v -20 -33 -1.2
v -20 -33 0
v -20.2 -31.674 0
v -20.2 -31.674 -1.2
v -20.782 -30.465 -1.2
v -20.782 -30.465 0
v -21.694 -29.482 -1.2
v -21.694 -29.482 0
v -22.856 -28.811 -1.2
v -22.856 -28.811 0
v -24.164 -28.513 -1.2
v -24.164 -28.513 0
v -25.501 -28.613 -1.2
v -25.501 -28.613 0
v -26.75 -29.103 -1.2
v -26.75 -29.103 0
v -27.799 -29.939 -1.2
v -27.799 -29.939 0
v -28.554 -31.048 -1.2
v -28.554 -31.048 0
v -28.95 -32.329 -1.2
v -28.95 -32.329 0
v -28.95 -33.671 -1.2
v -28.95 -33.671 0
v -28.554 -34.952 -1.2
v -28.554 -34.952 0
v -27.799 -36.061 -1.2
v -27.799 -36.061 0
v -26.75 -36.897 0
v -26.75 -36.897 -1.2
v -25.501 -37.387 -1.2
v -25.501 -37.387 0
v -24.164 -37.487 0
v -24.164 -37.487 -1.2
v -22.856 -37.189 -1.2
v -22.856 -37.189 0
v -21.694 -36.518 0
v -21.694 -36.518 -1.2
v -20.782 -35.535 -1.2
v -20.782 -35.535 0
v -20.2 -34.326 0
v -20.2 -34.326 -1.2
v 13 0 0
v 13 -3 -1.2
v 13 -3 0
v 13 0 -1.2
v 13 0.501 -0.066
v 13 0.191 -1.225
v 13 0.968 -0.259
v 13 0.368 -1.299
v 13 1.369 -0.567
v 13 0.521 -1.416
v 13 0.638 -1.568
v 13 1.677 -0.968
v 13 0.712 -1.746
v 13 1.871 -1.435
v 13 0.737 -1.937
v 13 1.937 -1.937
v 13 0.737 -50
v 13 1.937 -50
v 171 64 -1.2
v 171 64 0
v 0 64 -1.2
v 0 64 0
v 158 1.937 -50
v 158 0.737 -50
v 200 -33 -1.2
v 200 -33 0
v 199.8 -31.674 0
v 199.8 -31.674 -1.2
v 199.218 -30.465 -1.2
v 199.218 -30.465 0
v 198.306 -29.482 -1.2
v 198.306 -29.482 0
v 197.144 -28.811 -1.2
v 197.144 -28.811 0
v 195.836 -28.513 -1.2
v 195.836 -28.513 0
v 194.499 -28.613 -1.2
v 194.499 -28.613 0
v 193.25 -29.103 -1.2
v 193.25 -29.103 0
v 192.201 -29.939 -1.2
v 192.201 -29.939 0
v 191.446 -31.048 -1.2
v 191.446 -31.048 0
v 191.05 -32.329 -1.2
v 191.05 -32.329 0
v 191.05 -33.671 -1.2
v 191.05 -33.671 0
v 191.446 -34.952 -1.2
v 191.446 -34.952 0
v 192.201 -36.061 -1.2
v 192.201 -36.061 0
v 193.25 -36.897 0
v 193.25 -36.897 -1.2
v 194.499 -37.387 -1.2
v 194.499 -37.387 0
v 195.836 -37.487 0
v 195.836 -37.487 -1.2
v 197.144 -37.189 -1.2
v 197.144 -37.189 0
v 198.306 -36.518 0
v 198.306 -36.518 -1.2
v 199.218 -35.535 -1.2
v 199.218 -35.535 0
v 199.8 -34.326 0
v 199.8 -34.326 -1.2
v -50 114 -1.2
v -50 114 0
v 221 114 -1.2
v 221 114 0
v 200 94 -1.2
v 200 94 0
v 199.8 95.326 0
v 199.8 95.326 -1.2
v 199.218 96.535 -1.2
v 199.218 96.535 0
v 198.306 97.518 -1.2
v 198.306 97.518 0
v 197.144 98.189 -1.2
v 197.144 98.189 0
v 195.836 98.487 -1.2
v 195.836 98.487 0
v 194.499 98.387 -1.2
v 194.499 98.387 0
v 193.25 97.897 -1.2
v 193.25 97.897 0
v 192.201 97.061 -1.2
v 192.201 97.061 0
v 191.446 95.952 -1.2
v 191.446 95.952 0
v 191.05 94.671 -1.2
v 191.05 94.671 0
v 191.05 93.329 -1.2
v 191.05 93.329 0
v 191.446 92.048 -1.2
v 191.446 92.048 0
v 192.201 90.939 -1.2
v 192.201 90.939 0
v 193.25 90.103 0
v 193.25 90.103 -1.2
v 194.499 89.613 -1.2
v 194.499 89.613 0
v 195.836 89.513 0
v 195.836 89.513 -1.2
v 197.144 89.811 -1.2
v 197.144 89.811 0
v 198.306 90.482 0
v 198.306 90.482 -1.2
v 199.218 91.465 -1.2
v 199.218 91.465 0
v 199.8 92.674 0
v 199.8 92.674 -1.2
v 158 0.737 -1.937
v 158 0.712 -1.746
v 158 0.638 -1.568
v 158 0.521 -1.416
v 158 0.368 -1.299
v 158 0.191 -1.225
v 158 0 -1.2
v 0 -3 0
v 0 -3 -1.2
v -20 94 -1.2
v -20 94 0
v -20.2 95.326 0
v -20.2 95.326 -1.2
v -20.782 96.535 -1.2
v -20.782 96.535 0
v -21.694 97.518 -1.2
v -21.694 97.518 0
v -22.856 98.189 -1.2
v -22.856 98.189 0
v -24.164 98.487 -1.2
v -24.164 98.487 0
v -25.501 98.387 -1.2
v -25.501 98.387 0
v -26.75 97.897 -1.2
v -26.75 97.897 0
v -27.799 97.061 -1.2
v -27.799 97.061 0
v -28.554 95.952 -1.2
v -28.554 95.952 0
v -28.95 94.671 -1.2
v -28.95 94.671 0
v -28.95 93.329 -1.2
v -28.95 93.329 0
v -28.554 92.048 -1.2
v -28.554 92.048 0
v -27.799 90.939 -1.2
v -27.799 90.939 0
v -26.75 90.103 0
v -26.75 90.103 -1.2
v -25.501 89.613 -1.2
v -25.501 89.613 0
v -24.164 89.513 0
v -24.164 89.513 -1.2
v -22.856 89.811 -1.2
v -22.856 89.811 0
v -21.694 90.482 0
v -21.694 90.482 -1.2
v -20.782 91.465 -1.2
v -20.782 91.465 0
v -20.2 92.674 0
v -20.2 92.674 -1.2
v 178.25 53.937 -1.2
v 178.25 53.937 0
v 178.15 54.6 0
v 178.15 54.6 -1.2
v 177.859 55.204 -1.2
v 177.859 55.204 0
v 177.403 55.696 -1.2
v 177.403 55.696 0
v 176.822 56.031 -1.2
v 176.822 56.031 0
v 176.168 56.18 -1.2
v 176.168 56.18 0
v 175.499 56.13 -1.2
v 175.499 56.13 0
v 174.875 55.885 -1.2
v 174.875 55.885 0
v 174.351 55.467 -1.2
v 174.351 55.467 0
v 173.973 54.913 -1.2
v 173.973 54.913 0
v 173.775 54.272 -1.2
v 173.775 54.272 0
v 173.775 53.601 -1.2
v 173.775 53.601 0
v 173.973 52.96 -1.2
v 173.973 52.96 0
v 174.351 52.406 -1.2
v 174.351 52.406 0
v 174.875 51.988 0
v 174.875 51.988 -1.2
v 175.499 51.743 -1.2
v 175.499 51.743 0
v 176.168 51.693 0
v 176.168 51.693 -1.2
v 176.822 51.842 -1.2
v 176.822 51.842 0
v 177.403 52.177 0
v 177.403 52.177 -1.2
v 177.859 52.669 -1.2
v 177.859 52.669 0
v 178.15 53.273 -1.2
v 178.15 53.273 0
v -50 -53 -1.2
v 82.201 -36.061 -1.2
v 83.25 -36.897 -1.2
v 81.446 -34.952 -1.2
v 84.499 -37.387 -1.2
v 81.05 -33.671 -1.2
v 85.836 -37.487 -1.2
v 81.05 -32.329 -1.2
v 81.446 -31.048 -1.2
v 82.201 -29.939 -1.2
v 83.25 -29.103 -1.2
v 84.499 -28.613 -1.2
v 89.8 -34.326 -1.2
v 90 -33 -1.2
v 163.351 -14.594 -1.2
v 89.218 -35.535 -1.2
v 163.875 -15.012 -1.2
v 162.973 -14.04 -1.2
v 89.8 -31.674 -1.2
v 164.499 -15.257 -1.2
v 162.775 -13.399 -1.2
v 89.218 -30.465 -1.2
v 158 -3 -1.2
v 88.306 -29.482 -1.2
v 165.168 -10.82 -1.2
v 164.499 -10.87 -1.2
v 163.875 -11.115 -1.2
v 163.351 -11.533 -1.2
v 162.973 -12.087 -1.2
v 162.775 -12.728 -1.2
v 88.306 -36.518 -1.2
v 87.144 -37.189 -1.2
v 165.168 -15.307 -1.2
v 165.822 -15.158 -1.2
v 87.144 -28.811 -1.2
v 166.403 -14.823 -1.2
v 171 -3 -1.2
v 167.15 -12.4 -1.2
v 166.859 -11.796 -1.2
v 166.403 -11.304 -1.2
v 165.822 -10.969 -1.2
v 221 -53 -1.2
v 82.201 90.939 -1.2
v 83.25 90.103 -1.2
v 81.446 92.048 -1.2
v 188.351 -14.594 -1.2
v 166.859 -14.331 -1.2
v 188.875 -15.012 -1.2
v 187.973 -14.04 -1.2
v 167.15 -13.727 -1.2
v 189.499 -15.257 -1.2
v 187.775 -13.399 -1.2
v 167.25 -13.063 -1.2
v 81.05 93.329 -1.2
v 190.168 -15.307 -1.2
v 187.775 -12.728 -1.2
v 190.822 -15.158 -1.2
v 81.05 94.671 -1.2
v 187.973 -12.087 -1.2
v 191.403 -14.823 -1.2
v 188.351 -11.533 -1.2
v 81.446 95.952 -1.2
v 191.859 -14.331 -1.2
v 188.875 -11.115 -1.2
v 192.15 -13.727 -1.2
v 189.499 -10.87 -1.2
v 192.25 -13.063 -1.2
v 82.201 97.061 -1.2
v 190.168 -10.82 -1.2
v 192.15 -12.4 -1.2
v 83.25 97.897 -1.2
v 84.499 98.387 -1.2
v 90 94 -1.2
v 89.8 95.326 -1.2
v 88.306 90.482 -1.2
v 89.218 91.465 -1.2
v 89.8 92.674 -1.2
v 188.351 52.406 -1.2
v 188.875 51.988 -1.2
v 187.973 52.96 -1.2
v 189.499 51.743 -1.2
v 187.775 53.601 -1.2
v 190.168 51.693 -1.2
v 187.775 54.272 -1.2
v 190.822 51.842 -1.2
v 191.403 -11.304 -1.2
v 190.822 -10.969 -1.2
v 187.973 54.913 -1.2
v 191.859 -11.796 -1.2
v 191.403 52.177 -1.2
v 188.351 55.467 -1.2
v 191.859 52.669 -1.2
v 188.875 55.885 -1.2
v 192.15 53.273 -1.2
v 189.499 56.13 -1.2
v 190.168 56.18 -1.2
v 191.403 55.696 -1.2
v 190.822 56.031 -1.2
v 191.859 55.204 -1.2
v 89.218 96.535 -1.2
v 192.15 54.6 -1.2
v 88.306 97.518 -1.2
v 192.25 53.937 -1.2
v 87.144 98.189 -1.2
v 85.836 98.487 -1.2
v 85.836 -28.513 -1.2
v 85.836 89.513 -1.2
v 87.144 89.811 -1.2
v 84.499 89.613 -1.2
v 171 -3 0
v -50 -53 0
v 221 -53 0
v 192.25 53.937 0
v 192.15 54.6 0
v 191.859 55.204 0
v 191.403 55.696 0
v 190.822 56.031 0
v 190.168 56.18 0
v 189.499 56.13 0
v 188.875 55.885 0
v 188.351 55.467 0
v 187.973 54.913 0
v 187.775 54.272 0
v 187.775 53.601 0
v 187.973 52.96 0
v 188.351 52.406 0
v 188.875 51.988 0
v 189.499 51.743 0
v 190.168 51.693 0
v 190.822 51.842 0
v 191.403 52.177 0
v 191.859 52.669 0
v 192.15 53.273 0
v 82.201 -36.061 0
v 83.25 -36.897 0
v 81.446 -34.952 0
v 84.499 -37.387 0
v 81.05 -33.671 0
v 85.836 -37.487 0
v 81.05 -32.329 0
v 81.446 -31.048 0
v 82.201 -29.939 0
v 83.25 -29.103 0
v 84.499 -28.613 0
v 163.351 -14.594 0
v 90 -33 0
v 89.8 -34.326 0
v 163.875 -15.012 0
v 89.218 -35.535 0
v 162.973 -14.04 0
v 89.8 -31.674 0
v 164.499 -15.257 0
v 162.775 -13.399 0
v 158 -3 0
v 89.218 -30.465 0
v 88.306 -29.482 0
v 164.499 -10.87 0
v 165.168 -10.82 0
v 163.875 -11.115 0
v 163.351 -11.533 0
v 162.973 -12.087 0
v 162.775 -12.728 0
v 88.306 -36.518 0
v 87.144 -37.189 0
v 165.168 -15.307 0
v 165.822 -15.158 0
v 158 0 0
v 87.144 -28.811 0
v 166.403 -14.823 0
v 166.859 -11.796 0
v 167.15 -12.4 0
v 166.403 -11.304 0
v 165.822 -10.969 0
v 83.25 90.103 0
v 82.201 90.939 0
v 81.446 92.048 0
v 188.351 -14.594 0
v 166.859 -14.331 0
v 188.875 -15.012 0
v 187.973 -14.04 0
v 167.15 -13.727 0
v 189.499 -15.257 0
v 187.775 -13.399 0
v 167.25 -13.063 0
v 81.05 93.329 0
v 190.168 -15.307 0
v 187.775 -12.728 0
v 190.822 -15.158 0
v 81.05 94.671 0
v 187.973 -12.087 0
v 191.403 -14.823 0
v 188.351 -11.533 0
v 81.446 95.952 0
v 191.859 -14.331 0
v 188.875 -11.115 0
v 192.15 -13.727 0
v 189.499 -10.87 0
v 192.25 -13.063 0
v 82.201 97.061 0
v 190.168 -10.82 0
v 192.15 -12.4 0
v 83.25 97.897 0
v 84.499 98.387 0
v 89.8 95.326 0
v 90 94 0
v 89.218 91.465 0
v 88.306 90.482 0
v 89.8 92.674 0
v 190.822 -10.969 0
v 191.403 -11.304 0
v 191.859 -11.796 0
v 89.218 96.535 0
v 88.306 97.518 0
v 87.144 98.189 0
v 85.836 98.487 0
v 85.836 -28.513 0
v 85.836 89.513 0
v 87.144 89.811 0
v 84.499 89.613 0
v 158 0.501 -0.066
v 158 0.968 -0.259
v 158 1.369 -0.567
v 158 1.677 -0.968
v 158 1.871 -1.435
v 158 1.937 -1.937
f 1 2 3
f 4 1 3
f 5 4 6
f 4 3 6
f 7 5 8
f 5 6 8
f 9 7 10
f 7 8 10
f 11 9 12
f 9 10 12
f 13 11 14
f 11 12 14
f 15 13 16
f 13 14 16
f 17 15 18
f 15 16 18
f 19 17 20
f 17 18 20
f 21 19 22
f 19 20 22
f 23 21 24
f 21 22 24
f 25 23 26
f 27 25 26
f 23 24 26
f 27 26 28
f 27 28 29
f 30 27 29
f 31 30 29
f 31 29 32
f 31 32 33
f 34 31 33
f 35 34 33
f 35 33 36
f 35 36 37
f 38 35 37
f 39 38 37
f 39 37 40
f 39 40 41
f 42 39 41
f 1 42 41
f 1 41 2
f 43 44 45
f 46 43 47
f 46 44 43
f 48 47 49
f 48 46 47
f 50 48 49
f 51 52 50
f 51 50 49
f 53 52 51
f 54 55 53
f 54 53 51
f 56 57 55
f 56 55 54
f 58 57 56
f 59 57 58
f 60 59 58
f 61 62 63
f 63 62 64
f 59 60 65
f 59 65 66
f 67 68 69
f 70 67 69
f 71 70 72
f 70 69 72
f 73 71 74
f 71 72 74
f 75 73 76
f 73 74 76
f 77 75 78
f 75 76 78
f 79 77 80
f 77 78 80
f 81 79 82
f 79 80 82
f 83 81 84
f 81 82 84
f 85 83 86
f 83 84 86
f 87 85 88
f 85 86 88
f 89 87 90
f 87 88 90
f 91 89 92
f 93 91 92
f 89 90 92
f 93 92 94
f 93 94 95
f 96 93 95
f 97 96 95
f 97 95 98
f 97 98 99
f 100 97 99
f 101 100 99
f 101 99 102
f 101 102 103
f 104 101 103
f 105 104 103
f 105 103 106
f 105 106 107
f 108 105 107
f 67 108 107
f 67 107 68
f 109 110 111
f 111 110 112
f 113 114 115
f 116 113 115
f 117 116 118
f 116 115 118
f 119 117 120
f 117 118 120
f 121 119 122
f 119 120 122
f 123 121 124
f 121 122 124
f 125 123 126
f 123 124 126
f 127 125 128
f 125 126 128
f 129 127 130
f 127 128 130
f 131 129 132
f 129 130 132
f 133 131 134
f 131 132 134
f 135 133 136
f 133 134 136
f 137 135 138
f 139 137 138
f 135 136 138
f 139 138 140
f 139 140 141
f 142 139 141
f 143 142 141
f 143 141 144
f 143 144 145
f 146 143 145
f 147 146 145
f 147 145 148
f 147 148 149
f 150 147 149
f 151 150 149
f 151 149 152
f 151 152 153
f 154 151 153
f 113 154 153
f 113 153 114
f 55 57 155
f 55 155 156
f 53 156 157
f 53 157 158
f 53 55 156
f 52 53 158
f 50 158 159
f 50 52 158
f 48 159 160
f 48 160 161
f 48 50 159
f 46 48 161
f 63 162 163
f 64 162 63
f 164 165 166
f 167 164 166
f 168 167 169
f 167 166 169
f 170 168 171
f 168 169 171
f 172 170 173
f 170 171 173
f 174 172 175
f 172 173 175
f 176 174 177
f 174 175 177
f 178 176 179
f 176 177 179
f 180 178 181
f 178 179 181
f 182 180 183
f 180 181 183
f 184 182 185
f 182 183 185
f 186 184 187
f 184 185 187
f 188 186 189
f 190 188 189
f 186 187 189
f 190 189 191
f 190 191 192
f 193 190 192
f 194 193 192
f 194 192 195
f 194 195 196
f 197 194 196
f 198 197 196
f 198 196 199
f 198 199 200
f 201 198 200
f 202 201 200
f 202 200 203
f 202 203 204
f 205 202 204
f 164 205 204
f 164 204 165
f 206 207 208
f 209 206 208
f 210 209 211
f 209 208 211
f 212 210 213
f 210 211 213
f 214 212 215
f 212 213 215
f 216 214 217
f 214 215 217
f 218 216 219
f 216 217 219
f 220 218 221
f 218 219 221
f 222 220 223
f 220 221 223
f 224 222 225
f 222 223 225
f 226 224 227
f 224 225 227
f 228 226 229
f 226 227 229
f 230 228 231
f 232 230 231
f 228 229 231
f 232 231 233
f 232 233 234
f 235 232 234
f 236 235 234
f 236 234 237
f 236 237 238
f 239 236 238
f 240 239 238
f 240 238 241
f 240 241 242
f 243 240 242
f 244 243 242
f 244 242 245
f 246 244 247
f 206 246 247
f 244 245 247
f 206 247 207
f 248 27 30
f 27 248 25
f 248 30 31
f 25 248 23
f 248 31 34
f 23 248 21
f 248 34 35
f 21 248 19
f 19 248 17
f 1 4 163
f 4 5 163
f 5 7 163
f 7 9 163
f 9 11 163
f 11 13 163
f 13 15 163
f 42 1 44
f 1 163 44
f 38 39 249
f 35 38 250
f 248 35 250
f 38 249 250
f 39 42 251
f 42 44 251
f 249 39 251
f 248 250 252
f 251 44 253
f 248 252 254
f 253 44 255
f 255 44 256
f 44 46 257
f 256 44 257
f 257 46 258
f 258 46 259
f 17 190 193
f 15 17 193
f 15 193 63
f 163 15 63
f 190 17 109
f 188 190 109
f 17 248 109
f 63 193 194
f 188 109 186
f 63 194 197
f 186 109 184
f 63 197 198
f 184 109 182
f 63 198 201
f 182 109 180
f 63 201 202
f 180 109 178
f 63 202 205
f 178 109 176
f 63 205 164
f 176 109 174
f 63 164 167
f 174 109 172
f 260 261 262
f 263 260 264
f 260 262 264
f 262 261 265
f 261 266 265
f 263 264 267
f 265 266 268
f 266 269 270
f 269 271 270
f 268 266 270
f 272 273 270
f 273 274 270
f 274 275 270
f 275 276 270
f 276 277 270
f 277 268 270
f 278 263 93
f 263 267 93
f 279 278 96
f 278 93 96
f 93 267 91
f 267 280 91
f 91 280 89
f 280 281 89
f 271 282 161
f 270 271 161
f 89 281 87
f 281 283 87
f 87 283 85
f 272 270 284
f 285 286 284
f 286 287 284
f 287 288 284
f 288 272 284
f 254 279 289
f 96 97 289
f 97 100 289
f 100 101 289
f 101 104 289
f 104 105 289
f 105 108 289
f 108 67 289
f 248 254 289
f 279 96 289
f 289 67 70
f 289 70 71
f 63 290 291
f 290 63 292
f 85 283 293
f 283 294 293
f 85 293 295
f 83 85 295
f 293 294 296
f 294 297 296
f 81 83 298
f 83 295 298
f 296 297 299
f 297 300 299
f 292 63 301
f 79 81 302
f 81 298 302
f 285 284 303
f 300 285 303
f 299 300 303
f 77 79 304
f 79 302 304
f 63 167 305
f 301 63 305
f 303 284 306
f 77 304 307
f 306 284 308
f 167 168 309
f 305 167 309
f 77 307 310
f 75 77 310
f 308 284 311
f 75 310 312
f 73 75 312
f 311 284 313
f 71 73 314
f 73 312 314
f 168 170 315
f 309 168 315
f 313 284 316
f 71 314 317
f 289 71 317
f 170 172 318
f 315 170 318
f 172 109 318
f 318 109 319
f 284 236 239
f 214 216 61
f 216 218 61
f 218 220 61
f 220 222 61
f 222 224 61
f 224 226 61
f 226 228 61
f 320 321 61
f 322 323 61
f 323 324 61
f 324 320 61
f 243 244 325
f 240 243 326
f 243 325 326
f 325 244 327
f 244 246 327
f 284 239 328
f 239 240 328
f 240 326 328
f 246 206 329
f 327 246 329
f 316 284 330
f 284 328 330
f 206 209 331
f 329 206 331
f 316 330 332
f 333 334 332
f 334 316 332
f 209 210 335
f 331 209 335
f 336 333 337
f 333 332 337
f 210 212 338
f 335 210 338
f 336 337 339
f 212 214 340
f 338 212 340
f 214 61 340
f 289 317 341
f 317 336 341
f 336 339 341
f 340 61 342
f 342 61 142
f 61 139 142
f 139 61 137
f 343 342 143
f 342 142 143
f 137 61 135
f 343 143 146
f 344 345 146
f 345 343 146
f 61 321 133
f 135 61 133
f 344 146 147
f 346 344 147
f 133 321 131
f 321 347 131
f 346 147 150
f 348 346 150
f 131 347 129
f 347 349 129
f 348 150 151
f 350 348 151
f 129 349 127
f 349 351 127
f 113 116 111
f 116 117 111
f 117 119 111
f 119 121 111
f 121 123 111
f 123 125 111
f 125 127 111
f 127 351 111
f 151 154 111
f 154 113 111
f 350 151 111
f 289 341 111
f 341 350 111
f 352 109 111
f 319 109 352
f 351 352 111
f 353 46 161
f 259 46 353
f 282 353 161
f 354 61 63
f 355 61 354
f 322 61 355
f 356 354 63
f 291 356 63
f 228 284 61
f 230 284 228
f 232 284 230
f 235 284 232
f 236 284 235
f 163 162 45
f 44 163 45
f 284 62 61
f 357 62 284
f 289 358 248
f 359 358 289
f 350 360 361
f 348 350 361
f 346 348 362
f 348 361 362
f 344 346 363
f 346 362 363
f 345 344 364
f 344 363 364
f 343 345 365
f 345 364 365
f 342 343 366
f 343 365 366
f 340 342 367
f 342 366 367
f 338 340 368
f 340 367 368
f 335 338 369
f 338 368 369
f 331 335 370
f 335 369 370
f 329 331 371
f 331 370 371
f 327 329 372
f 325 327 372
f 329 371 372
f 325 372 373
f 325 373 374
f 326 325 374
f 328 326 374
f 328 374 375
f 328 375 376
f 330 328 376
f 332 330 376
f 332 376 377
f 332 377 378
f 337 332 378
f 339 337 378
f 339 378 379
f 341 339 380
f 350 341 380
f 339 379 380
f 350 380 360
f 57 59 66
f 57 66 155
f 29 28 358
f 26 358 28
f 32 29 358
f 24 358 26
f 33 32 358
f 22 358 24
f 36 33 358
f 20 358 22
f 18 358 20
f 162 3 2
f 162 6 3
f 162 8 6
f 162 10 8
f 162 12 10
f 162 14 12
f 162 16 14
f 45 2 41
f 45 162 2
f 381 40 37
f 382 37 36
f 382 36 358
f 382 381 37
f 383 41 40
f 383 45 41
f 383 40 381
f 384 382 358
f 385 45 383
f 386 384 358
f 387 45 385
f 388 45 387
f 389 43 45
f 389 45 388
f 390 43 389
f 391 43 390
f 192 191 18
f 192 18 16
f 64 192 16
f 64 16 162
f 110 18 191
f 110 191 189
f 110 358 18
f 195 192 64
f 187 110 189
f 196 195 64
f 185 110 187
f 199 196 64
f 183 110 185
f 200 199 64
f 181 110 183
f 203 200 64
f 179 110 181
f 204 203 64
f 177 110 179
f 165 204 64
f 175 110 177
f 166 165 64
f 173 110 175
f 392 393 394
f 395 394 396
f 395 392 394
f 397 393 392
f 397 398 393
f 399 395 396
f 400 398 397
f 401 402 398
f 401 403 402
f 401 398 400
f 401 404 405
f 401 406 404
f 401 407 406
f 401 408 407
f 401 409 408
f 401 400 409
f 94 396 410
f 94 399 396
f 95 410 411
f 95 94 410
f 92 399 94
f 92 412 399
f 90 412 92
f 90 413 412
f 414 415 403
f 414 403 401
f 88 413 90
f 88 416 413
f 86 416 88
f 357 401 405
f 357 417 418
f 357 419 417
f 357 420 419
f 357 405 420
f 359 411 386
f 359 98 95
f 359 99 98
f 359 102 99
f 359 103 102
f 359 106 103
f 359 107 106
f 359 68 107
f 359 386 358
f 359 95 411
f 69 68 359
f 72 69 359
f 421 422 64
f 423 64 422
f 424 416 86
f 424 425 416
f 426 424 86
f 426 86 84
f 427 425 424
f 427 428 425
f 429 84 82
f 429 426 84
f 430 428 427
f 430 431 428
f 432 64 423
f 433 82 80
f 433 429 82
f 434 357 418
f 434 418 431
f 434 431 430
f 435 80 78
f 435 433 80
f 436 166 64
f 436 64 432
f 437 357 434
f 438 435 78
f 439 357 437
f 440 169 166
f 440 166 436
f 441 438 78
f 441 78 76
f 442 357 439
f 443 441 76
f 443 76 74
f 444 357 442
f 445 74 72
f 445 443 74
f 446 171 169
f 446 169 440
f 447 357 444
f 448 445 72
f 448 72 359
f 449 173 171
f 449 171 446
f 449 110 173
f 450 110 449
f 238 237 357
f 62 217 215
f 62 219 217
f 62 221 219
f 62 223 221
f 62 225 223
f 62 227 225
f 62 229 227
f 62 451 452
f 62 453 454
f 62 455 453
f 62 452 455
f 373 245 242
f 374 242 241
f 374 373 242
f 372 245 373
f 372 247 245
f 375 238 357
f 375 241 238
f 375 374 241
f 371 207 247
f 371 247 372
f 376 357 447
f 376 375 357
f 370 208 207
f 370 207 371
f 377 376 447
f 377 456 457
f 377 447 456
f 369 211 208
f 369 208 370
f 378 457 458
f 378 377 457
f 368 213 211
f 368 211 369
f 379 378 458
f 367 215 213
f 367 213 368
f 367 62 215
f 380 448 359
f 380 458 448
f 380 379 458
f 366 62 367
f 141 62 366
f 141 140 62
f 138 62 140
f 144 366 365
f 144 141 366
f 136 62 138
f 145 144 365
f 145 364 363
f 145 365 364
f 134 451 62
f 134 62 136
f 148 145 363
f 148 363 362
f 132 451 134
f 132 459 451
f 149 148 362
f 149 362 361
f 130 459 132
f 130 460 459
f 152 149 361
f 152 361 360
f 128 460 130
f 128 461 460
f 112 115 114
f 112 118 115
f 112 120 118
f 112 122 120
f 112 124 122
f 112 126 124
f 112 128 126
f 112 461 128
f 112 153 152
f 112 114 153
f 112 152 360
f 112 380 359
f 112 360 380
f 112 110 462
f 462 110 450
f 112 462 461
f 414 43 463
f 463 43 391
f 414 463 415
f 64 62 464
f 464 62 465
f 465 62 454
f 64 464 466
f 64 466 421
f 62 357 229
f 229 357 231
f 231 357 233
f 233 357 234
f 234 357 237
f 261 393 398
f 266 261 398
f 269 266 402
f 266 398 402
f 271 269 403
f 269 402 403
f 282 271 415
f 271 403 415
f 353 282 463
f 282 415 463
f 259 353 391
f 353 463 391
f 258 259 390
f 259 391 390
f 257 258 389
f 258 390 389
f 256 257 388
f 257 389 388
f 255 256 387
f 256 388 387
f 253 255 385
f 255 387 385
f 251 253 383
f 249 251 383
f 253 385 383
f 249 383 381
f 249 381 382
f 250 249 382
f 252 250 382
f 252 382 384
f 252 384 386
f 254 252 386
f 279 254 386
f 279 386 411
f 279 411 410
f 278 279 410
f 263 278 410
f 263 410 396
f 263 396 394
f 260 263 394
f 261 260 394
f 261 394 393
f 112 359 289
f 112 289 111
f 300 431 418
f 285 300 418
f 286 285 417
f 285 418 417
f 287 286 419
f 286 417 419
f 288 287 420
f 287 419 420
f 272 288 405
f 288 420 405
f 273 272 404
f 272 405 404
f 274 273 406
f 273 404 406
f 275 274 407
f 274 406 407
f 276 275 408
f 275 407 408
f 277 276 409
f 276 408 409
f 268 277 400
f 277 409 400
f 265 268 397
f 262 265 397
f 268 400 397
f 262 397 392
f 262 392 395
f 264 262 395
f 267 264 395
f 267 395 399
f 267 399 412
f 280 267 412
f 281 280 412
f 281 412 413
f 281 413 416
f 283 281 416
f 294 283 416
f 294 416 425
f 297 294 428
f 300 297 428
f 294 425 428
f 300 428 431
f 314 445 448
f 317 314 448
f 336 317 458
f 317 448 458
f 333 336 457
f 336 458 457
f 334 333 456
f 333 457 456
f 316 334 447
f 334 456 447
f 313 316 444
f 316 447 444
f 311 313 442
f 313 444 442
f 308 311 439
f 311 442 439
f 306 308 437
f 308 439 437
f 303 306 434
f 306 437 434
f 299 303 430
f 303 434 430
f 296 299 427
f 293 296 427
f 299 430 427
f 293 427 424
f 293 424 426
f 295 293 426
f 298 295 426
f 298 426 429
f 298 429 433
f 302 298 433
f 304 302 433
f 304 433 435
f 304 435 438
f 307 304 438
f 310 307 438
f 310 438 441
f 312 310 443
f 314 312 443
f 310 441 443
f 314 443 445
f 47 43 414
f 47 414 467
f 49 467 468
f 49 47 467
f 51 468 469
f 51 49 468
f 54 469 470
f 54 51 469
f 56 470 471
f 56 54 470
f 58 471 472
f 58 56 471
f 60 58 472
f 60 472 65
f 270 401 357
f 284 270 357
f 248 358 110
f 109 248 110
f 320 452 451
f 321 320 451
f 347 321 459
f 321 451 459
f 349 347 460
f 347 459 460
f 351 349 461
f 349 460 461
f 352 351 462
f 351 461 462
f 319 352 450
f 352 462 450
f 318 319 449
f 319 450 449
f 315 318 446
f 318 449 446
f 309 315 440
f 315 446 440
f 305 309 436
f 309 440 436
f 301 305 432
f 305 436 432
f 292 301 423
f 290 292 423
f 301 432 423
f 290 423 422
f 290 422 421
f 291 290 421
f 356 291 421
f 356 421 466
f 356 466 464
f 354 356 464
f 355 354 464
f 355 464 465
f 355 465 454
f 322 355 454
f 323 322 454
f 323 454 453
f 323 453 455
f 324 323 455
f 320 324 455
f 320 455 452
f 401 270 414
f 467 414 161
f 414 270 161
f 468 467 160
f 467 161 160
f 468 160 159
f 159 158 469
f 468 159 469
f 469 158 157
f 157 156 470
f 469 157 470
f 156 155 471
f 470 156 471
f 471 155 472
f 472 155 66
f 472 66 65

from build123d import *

# Parameters (mm, degrees)
SKETCH_1_W             = 271
SKETCH_1_H             = 167
SKETCH_1_R             = 2.25
SM_BASE_FLANGE_1_DEPTH = 1.2
SM_EDGE_FLANGE_1_DEPTH = 145
CUT_EXTRUDE_1_REACH    = 255.647
SKETCH_9_R             = 4.5


# Sheet-metal steps are written as plain solids
with BuildPart() as part:
    # Sketch 1 → Базовая кромка1 (new body)
    with BuildSketch(Plane.XY):
        with Locations((85.5, 30.5)):
            Rectangle(SKETCH_1_W, SKETCH_1_H)
        with Locations((176, 53.9366)):
            Circle(SKETCH_1_R, mode=Mode.SUBTRACT)
        with Locations((190, 53.9366)):
            Circle(SKETCH_1_R, mode=Mode.SUBTRACT)
        with Locations((165, -13.0634)):
            Circle(SKETCH_1_R, mode=Mode.SUBTRACT)
        with Locations((190, -13.0634)):
            Circle(SKETCH_1_R, mode=Mode.SUBTRACT)
        Polygon((13, 0), (158, 0), (158, -3), (171, -3), (171, 0), (171, 64), (0, 64), (0, 0), (0, -3), (13, -3), align=None, mode=Mode.SUBTRACT)
    extrude(amount=-SM_BASE_FLANGE_1_DEPTH)

    # Ребро-кромка1 section (across the edge) → Ребро-кромка1 (add)
    with BuildSketch(Plane(origin=(13, 0.7366, -1.2), x_dir=(0, -1, 0), z_dir=(1, 0, 0))):
        with BuildLine():
            Line((-1.2, 0.7366), (-1.2, 48.8))
            Line((-1.2, 48.8), (0, 48.8))
            Line((0, 48.8), (0, 0.7366))
            ThreePointArc((0, 0.7366), (0.215745145, 0.215745145), (0.7366, 0))
            Line((0.7366, 0), (0.7366, -1.2))
            ThreePointArc((0.7366, -1.2), (-0.632782992, -0.632782992), (-1.2, 0.7366))
        make_face()
    extrude(amount=SM_EDGE_FLANGE_1_DEPTH)

    # Эскиз9 → Вырез-Вытянуть1 (cut, up to next)
    with BuildSketch(Plane.XY, mode=Mode.PRIVATE) as cut_extrude_1_sk1:
        with Locations((-24.5, 94)):
            Circle(SKETCH_9_R)
    cut_extrude_1_tool1 = extrude(cut_extrude_1_sk1.sketch, amount=-CUT_EXTRUDE_1_REACH, mode=Mode.PRIVATE) & part.part
    # Эскиз9 → Вырез-Вытянуть1 (cut, up to next)
    with BuildSketch(Plane.XY, mode=Mode.PRIVATE) as cut_extrude_1_sk2:
        with Locations((-24.5, -33)):
            Circle(SKETCH_9_R)
    cut_extrude_1_tool2 = extrude(cut_extrude_1_sk2.sketch, amount=-CUT_EXTRUDE_1_REACH, mode=Mode.PRIVATE) & part.part
    # Эскиз9 → Вырез-Вытянуть1 (cut, up to next)
    with BuildSketch(Plane.XY, mode=Mode.PRIVATE) as cut_extrude_1_sk3:
        with Locations((85.5, -33)):
            Circle(SKETCH_9_R)
    cut_extrude_1_tool3 = extrude(cut_extrude_1_sk3.sketch, amount=-CUT_EXTRUDE_1_REACH, mode=Mode.PRIVATE) & part.part
    # Эскиз9 → Вырез-Вытянуть1 (cut, up to next)
    with BuildSketch(Plane.XY, mode=Mode.PRIVATE) as cut_extrude_1_sk4:
        with Locations((85.5, 94)):
            Circle(SKETCH_9_R)
    cut_extrude_1_tool4 = extrude(cut_extrude_1_sk4.sketch, amount=-CUT_EXTRUDE_1_REACH, mode=Mode.PRIVATE) & part.part
    # Эскиз9 → Вырез-Вытянуть1 (cut, up to next)
    with BuildSketch(Plane.XY, mode=Mode.PRIVATE) as cut_extrude_1_sk5:
        with Locations((195.5, 94)):
            Circle(SKETCH_9_R)
    cut_extrude_1_tool5 = extrude(cut_extrude_1_sk5.sketch, amount=-CUT_EXTRUDE_1_REACH, mode=Mode.PRIVATE) & part.part
    # Эскиз9 → Вырез-Вытянуть1 (cut, up to next)
    with BuildSketch(Plane.XY, mode=Mode.PRIVATE) as cut_extrude_1_sk6:
        with Locations((195.5, -33)):
            Circle(SKETCH_9_R)
    cut_extrude_1_tool6 = extrude(cut_extrude_1_sk6.sketch, amount=-CUT_EXTRUDE_1_REACH, mode=Mode.PRIVATE) & part.part
    add(cut_extrude_1_tool1.solids().sort_by_distance((-24.5, 94, 0))[0], mode=Mode.SUBTRACT)
    add(cut_extrude_1_tool2.solids().sort_by_distance((-24.5, -33, 0))[0], mode=Mode.SUBTRACT)
    add(cut_extrude_1_tool3.solids().sort_by_distance((85.5, -33, 0))[0], mode=Mode.SUBTRACT)
    add(cut_extrude_1_tool4.solids().sort_by_distance((85.5, 94, 0))[0], mode=Mode.SUBTRACT)
    add(cut_extrude_1_tool5.solids().sort_by_distance((195.5, 94, 0))[0], mode=Mode.SUBTRACT)
    add(cut_extrude_1_tool6.solids().sort_by_distance((195.5, -33, 0))[0], mode=Mode.SUBTRACT)


solid = part.part
